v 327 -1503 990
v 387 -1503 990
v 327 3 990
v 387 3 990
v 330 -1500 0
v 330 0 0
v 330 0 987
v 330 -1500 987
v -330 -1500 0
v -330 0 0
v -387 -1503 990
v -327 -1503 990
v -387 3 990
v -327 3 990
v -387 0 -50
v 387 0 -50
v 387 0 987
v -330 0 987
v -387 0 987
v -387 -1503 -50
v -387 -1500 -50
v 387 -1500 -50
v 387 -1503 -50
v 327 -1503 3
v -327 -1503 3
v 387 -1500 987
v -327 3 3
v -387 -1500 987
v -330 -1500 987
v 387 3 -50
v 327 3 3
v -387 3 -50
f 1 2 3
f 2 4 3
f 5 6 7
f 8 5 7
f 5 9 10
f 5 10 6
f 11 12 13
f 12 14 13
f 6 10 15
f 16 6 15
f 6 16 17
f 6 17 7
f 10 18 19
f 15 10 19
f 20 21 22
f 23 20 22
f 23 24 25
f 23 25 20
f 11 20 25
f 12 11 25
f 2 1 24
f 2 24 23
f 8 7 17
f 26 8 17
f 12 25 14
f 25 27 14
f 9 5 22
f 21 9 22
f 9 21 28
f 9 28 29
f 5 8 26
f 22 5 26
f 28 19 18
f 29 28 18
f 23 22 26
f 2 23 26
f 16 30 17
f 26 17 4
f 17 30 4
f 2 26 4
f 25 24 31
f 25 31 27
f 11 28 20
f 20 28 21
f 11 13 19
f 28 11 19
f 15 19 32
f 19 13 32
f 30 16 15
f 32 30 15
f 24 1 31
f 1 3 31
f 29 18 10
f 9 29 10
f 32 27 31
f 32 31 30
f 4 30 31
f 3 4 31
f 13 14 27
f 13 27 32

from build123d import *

# Parameters (mm, degrees)
F1_DEPTH = 1500
F2_T     = -3
F3_W     = 60
F3_H     = 1500
F4_DEPTH = 3
F6_DEPTH = 3
F8_DEPTH = 3


with BuildPart() as f1:
    # F0 (on Front) → F1 (new body)
    with BuildSketch(Plane.XZ):
        Polygon((330, 990), (-330, 990), (-330, 0), (0, 0), (330, 0), align=None)
    extrude(amount=F1_DEPTH)

    # F2
    f2_openings = [f1.faces().sort_by_distance(p)[0] for p in [
        (0, -1500, 495),
        (0, -750, 990),
        (0, 0, 495),
    ]]
    offset(amount=F2_T, openings=f2_openings)

    # F3 (on face) → F4 (join)
    with BuildSketch(Plane.XY.offset(990)):
        with Locations((-357, -750)):
            Rectangle(F3_W, F3_H)
        with Locations((357, -750)):
            Rectangle(F3_W, F3_H)
    extrude(amount=-F4_DEPTH)

    # F5 (on face) → F6 (join)
    with BuildSketch(Plane(origin=(0, 0, 0), x_dir=(-1, 0, 0), z_dir=(0, 1, 0))):
        Polygon((387, 990), (327, 990), (327, 3), (-327, 3), (-327, 990), (-387, 990), (-387, -50), (-75.369177, -50), (387, -50), align=None)
    extrude(amount=F6_DEPTH)

    # F7 (on face) → F8 (join)
    with BuildSketch(Plane.XZ.offset(1500)):
        Polygon((387, -50), (387, 990), (327, 990), (327, 3), (-327, 3), (-327, 990), (-387, 990), (-387, -50), (-70.356654, -50), align=None)
    extrude(amount=F8_DEPTH)


solid = f1.part
